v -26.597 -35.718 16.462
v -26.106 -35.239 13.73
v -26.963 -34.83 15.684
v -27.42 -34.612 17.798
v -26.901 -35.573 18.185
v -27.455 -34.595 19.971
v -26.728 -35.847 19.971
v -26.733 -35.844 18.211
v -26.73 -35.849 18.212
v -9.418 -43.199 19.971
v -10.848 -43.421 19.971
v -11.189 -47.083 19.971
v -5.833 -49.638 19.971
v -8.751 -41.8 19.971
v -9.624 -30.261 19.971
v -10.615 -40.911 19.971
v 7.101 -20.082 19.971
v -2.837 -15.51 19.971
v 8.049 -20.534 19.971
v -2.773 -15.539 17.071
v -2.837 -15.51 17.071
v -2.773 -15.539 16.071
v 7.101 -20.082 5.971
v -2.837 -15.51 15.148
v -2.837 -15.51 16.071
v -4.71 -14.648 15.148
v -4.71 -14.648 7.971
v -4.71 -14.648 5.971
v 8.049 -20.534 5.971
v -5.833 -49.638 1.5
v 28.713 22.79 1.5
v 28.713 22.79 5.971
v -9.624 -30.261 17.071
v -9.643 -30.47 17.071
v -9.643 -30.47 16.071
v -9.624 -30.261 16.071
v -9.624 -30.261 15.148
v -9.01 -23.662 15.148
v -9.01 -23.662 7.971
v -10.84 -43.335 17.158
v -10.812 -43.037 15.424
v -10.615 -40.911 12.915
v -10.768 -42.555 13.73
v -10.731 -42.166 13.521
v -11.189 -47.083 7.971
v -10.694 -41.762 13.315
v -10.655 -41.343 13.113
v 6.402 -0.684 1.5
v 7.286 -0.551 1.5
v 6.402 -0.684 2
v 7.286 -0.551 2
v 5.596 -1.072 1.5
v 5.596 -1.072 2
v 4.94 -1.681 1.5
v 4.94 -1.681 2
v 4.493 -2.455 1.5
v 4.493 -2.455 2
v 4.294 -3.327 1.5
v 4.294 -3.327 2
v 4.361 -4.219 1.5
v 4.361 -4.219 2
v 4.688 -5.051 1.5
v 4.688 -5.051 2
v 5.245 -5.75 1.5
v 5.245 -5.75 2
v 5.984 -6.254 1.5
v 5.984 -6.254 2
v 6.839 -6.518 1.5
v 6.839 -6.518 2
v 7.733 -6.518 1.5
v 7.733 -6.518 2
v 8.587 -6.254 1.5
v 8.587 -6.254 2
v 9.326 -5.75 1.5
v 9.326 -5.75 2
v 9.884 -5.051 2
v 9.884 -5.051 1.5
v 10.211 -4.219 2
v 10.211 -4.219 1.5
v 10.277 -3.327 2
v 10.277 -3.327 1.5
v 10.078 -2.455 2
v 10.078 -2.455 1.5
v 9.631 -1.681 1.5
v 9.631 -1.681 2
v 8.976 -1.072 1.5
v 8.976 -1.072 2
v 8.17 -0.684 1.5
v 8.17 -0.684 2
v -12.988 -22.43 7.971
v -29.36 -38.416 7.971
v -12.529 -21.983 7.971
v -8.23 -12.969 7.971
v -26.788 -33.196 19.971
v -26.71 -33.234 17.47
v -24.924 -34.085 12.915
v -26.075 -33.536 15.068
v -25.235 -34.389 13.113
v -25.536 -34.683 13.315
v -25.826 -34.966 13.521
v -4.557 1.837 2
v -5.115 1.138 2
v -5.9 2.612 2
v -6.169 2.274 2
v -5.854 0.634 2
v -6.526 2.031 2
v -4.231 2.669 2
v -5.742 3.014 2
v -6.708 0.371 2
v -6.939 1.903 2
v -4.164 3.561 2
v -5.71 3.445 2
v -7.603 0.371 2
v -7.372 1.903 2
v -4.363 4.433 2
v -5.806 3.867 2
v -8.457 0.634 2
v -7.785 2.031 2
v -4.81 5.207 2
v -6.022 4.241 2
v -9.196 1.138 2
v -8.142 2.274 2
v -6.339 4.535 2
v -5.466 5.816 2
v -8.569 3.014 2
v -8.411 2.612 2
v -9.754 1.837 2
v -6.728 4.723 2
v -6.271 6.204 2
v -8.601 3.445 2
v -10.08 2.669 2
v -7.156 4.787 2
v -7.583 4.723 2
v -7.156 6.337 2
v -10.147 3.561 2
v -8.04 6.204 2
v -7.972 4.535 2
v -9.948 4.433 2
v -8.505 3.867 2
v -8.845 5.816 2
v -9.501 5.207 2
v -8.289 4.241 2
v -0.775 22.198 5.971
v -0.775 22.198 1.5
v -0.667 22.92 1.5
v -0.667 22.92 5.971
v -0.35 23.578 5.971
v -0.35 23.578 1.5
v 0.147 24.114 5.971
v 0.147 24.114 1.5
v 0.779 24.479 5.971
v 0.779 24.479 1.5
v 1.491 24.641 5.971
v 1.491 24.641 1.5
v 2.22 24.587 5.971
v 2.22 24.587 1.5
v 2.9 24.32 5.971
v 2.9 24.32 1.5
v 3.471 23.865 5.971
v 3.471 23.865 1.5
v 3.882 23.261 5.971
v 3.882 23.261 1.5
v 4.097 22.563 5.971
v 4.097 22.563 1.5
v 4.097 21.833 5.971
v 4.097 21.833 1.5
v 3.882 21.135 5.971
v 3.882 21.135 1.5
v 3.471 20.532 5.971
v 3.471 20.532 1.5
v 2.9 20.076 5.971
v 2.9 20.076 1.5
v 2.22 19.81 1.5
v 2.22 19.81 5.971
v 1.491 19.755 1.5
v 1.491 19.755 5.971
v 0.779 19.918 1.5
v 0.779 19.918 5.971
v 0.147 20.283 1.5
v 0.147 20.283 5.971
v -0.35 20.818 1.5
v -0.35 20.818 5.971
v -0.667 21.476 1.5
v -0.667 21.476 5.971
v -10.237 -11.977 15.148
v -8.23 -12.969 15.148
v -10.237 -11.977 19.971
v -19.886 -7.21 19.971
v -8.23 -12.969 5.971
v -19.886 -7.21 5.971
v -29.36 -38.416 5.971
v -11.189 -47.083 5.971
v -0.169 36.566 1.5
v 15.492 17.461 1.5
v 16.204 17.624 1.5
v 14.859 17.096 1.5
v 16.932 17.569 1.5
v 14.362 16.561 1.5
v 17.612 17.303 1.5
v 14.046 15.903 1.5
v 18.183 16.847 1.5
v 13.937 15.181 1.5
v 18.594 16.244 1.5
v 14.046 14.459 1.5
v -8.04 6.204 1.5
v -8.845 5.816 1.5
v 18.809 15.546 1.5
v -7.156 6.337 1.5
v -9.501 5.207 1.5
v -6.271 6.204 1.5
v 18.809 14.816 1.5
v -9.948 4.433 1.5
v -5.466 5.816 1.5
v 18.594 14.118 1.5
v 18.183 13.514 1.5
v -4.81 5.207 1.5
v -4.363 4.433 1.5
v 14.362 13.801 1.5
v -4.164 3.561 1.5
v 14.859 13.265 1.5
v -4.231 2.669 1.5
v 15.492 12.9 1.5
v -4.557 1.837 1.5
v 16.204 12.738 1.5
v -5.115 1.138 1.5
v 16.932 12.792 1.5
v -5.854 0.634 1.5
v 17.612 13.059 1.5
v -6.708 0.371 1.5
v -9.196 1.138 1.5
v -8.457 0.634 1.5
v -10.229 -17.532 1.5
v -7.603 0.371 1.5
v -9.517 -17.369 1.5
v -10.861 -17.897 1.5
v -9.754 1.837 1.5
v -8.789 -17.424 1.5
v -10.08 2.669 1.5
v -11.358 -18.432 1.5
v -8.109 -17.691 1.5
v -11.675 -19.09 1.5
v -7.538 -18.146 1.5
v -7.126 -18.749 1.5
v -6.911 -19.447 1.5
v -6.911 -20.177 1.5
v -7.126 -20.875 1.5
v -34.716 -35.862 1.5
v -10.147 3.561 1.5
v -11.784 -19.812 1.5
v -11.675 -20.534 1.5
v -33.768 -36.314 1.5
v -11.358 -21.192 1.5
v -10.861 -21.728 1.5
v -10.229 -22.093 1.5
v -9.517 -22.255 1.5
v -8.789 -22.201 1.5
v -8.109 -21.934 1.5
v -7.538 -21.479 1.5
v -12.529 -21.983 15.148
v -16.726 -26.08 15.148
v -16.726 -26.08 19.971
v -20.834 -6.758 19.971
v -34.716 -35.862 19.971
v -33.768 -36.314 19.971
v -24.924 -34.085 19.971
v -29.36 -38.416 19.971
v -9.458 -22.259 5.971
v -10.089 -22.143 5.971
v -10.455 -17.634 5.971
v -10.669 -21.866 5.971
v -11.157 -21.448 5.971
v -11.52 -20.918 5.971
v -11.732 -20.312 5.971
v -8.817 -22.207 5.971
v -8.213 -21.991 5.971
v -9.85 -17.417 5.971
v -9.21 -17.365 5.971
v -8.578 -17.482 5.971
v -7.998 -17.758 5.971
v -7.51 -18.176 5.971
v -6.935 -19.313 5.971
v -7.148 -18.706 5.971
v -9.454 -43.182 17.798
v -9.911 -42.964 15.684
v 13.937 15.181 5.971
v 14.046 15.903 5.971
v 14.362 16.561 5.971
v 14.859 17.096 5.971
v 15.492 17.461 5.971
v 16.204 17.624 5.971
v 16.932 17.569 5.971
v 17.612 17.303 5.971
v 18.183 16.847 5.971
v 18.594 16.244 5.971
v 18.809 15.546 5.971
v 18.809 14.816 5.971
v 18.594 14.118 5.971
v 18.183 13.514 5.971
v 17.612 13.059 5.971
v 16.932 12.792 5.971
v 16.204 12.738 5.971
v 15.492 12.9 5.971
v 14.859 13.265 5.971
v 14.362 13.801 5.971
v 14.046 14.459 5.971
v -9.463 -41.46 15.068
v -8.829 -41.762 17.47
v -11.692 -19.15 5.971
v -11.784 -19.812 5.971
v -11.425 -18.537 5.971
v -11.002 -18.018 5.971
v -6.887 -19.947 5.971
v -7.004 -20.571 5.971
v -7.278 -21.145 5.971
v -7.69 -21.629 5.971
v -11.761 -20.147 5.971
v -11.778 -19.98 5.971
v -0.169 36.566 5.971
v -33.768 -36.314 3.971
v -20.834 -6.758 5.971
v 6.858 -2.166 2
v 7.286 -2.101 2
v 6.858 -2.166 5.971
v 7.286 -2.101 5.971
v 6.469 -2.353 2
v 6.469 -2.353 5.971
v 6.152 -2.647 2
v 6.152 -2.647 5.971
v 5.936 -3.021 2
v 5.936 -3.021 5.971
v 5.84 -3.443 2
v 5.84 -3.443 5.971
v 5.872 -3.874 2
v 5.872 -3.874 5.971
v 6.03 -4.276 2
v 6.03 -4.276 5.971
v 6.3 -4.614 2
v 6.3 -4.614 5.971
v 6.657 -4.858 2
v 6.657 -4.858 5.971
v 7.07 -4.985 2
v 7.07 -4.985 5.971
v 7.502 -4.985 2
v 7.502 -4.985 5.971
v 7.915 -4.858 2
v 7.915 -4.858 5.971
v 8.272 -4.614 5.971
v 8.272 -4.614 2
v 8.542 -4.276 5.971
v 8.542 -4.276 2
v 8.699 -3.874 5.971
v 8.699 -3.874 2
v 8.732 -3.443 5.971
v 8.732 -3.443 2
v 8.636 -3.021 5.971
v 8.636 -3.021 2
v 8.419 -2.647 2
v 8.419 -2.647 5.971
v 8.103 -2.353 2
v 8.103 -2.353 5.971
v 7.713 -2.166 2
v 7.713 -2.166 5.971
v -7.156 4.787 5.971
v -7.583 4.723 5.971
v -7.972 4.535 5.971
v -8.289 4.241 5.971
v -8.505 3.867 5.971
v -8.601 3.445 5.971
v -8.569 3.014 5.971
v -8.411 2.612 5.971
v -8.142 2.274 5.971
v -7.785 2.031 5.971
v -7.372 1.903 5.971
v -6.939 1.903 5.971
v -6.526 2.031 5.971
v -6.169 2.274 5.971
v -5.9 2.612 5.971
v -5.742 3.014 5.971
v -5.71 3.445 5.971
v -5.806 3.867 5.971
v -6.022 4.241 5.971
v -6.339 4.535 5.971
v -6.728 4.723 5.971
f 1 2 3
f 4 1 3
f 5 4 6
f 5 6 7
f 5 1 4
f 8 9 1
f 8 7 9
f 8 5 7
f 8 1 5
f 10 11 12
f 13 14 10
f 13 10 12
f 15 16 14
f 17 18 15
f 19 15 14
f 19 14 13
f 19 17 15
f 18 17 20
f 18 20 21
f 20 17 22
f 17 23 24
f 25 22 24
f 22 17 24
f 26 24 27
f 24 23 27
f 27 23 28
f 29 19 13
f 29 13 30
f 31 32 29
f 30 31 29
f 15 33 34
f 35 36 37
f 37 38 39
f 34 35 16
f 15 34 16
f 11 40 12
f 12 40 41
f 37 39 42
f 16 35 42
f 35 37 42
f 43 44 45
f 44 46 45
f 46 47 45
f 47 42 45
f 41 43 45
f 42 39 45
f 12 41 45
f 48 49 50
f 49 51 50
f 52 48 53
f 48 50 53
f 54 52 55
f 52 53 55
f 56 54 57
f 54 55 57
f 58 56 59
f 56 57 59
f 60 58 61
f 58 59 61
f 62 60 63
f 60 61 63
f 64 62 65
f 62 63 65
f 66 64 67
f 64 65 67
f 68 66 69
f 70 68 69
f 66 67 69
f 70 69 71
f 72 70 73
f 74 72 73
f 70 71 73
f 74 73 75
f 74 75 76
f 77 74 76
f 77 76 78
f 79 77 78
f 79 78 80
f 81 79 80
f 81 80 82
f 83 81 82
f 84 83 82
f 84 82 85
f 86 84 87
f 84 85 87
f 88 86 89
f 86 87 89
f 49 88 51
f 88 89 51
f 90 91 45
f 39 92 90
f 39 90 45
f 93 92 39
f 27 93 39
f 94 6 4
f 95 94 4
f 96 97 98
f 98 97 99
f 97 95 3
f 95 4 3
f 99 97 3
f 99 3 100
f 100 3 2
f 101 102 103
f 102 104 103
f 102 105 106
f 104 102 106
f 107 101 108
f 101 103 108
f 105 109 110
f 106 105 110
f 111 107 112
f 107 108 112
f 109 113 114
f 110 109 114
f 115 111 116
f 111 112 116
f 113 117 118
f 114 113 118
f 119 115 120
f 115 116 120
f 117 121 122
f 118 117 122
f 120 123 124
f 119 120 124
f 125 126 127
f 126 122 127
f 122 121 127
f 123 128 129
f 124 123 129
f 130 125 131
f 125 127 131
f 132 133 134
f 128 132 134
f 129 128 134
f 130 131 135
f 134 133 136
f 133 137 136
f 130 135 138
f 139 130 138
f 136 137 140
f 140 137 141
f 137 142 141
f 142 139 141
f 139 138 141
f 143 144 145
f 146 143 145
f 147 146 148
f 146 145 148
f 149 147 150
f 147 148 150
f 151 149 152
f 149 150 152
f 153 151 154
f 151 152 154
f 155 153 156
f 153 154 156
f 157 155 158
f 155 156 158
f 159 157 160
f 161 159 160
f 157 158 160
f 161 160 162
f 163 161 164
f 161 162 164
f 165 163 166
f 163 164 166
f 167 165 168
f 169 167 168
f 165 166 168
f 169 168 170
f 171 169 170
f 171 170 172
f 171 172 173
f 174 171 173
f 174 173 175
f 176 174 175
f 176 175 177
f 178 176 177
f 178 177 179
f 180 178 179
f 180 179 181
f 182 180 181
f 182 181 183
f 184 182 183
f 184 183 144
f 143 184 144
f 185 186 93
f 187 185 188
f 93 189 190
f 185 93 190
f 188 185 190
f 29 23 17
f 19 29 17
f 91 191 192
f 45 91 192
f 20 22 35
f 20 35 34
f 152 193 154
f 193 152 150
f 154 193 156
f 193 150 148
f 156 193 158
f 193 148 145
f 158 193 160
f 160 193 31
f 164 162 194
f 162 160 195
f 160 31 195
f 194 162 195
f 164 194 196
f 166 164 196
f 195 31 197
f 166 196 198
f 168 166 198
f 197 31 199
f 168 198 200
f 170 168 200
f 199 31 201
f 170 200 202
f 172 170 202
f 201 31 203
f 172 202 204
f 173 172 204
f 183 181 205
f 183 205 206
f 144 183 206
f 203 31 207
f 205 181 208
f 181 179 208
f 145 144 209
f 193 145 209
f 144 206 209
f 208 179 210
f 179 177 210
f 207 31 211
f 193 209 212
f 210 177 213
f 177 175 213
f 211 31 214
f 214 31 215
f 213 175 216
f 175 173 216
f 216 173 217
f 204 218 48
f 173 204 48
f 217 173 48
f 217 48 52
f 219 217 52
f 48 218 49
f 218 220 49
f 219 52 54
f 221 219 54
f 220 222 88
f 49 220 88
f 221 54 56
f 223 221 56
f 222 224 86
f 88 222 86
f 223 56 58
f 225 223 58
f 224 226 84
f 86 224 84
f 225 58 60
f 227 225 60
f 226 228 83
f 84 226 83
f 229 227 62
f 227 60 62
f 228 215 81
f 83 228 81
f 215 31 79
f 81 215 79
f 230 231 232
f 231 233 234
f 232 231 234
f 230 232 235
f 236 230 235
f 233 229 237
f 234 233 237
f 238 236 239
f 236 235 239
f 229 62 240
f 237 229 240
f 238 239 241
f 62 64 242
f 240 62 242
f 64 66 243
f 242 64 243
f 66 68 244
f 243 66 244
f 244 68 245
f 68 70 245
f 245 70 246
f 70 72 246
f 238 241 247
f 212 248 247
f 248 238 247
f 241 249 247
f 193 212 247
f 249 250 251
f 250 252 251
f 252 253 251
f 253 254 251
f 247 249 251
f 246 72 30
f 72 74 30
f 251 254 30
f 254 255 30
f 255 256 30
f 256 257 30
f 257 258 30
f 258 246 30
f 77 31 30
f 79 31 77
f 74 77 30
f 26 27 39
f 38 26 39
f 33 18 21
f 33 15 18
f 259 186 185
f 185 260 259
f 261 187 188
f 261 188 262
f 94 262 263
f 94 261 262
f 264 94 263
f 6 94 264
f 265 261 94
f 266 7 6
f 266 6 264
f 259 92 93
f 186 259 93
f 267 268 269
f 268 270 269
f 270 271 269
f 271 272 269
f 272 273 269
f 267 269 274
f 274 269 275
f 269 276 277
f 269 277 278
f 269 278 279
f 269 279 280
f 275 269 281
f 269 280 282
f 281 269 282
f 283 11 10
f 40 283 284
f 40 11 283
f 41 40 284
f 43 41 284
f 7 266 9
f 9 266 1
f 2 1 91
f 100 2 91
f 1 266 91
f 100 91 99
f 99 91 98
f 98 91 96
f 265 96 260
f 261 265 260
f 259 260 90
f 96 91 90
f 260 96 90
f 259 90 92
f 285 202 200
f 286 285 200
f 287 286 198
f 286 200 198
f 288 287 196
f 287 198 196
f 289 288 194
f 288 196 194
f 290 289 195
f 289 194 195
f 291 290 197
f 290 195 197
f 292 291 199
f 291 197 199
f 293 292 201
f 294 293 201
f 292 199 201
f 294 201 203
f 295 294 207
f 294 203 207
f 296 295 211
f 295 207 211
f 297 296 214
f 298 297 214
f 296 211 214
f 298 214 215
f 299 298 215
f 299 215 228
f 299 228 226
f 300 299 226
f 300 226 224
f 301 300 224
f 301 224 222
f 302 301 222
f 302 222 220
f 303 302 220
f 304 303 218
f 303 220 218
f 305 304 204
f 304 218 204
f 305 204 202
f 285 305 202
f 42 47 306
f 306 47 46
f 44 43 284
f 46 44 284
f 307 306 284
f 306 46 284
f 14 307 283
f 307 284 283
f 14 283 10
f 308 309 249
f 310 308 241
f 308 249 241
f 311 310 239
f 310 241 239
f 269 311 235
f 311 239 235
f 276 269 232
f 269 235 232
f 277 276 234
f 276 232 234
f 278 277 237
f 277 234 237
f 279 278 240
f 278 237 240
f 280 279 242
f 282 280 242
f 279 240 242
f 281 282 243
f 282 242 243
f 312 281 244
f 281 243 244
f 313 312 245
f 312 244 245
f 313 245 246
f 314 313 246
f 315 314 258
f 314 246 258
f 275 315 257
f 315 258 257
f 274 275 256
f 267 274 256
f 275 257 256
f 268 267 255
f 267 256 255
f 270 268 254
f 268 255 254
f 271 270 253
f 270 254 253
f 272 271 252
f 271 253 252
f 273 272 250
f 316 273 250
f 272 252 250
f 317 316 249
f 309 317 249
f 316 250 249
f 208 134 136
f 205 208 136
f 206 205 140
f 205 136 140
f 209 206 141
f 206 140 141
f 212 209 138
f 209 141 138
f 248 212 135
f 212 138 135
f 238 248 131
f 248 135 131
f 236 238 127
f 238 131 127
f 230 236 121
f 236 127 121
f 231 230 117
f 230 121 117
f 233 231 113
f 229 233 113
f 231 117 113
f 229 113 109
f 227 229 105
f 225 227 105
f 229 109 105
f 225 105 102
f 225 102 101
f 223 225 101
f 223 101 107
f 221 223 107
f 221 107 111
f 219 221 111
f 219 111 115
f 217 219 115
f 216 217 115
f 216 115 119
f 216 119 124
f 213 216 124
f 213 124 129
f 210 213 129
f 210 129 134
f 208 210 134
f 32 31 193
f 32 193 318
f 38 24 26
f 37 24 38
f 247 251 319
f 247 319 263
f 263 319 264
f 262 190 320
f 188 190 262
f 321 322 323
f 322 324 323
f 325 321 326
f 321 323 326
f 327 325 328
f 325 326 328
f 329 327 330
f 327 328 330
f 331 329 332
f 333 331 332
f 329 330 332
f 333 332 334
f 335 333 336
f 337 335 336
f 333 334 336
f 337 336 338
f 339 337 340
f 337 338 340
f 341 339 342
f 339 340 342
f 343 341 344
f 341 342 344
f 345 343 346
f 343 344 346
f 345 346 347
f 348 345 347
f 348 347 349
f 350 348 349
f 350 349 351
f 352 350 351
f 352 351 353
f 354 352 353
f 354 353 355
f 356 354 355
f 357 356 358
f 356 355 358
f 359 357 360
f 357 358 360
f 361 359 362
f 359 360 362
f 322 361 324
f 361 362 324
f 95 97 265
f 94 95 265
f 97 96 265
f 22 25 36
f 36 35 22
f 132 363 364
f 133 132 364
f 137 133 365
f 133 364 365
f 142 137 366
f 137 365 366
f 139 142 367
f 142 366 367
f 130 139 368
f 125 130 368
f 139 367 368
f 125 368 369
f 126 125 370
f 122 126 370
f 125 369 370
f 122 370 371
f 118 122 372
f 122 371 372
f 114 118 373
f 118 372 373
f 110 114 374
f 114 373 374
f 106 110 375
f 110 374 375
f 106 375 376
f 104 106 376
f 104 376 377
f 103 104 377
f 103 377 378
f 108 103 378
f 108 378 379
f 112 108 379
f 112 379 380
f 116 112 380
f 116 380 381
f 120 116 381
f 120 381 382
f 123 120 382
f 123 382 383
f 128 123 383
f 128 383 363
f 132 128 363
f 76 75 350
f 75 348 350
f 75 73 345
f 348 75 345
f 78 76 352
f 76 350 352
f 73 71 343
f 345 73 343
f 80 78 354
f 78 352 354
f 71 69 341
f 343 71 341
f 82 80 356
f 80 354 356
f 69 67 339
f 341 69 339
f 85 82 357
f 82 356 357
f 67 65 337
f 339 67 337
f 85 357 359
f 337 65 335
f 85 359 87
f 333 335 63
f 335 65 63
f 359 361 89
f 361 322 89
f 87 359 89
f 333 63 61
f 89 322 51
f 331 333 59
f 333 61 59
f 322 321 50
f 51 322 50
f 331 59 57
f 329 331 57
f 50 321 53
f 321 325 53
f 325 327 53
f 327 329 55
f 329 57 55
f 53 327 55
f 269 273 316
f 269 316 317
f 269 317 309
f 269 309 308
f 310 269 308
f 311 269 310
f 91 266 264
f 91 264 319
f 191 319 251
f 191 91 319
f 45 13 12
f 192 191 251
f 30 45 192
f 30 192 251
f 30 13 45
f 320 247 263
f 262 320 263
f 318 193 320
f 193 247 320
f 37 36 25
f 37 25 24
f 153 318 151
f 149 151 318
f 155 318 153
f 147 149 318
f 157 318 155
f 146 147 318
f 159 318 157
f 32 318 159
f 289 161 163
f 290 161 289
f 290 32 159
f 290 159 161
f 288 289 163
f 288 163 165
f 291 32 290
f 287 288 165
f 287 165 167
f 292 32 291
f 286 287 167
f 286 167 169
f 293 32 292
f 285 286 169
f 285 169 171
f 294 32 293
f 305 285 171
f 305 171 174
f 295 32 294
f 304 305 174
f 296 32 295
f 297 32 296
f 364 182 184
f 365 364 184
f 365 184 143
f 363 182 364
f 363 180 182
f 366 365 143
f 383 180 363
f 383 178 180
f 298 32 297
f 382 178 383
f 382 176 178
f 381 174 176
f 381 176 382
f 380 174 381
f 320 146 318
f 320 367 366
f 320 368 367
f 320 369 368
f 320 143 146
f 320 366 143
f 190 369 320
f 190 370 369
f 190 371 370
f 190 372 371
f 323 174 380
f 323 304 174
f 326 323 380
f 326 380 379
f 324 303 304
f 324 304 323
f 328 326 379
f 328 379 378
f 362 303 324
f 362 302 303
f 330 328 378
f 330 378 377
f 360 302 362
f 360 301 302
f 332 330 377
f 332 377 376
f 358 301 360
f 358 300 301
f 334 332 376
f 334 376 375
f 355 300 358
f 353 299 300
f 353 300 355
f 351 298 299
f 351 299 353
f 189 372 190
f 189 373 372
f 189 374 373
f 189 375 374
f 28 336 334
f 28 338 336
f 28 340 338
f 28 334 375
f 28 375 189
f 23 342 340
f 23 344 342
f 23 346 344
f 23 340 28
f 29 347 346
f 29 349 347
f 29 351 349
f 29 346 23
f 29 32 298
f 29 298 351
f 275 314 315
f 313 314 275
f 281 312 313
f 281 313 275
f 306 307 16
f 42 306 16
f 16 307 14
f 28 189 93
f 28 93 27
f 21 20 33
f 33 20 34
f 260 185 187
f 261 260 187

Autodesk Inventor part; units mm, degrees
ref_plane "YZ Plane" through (0, 0, 0) normal (1, 0, 0) x (0, 1, 0)
ref_plane "XZ Plane" through (0, 0, 0) normal (0, 1, 0) x (-1, 0, 0)
ref_plane "Work Plane1" through (0, 0, 1.5) normal (0, 0, 1) x (1, 0, 0)
sketch "Sketch1" plane through (0, 0, 1.5) normal (0, 0, 1) x (1, 0, 0)
  line L0 (8.75354, 57.756452) -> (7.809034, 57.756452) construction
  line L1 (-24.776894, -15.05709) -> (8.75354, 57.756452) construction
  line L2 (-24.776894, -52.66184) -> (-24.776894, -15.05709) construction
  line L3 (-18.707308, -55.556884) -> (-24.776894, -52.66184) construction
  line L4 (-18.707308, -40.563421) -> (-18.707308, -55.556884) construction
  line L5 (0.391621, -40.563421) -> (-18.707308, -40.563421) construction
  line L6 (23.692692, 8.28829) -> (0.391621, -40.563421) construction
  line L7 (23.692692, 53.178978) -> (23.692692, 8.28829) construction
  line L8 (8.974225, 60.199326) -> (23.692692, 53.178978) construction
  line L9 (7.809034, 57.756452) -> (8.974225, 60.199326) construction
  circle A0 centre (-21.307308, -37.886297) radius 1.6 construction
  circle A1 centre (-21.307308, -27.886297) radius 1.6 construction
  line L10 (11.632256, -10.582296) -> (32.395806, 32.949392)
  line L11 (-15.355044, 2.289986) -> (5.408506, 45.821674)
  line L12 (5.408506, 45.821674) -> (32.395806, 32.949392)
  line L13 (32.395806, 32.949392) -> (-10.655303, -57.309136)
  line L14 (-10.655303, -57.309136) -> (-37.642603, -44.436855)
  line L15 (-37.642603, -44.436855) -> (5.408506, 45.821674)
  circle A2 centre (11.737087, 5.432666) radius 3
  circle A3 centre (-13.983408, -29.560487) radius 3
  circle A4 centre (-2.975053, 12.449997) radius 3
  point P0 (0, 0)
  dimension "d1" = 100
ref_plane "Work Plane2" through (4.456703, -9.721274, 3.970957) normal (0, 0, -1) x (0.4305111, 0.9025853, 0)
ref_plane "Work Plane6" through (4.456703, -9.721274, 2.470957) normal (0, 0, -1) x (0.4305111, 0.9025853, 0)
extrude "Extrusion1" add sketch "Sketch1" along normal up to surface (2.470957 mm away) contours L13 L14 L15 L11 L12 L10 | A2 | A3 | A4
sketch "Sketch2" plane through (-10.655303, -57.309136, 3.970957) normal (0, 0, 1) x (0.9025853, -0.4305111, 0)
  line L0 (0, 0) -> (0, 100)
  line L1 (0, 100) -> (-29.9, 100)
  line L2 (-29.9, 100) -> (-29.9, 0)
  line L3 (-29.9, 0) -> (0, 0)
  line L4 (-21.95, 51.77) -> (-27.9, 51.77)
  line L5 (-2, 51.77) -> (-7.95, 51.77)
  line L6 (-19.05, 34.77) -> (-10.85, 34.77)
  arc A0 (-27.45, 2.77) -> (-2.45, 2.77) centre (-14.95, 20.30125) ccw construction
  arc A1 (-2.45, 4.77) -> (-27.45, 4.77) centre (-14.95, -12.76125) ccw construction
  line L7 (-27.45, 2.77) -> (-27.45, 4.77) construction
  line L8 (-2.45, 2.77) -> (-2.45, 4.77) construction
  line L9 (-29.9, 0) -> (0, 0)
  line L10 (-25.477276, 0) -> (-25.477276, 7.745132)
  line L11 (-25.477276, 7.745132) -> (-16.899837, 31.078166)
  line L12 (-16.899837, 31.078166) -> (-16.899837, 41.065184)
  line L13 (-16.899837, 41.065184) -> (-29.9, 41.24513)
  line L14 (-29.9, 100) -> (-29.9, 0)
  line L15 (-29.9, 0) -> (-29.9, 41.24513)
  line L16 (-14.95, 0) -> (-14.95, 40.435372) construction
  line L17 (-2.45, 2.77) -> (-2.45, 4.77) construction
  line L18 (-4.422724, 0) -> (-4.422724, 7.745132)
  line L19 (-4.422724, 7.745132) -> (-13.000163, 31.078166)
  line L20 (-13.000163, 31.078166) -> (-13.000163, 41.065184)
  line L21 (-13.000163, 41.065184) -> (0, 41.24513)
  line L22 (0, 0) -> (0, 41.24513)
  line L23 (0, 0) -> (0, 100) construction
  line L24 (0, 41.24513) -> (0, 0) construction
  line L25 (0, 0) -> (-4.422724, 0) construction
  point P0 (-15.054899, 56.31361)
extrude "Extrusion2" add sketch "Sketch2" along normal blind 16 contours L3 L2 L13 L12 L11 L10
ref_plane "Work Plane3" through (-24.148953, -50.872995, 3.970957) normal (0.9025853, -0.4305111, 0) x (0, 0, -1)
mirror "Mirror1" about plane through (-24.148953, -50.872995, 3.970957) normal (0.9025853, -0.4305111, 0) of "Extrusion2"
sketch "Sketch3" plane through (-4.710042, -14.647591, 19.970957) normal (0.4179776, 0.9084573, 0) x (0.9084573, -0.4179776, 0)
  ellipse E0 centre (-1.967577, -0.95) end of major axis (-1.967577, 1.897221) minor radius 2.846948 construction
  line L0 (2.132031, -4.8) -> (2.132031, 2.9) construction
  line L1 (2.132031, 2.9) -> (-6.067184, 2.9) construction
  line L2 (-6.067184, 2.9) -> (-6.067184, -4.8) construction
  line L3 (-6.067184, -4.8) -> (2.132031, -4.8) construction
  line L4 (2.132031, -4.8) -> (2.132031, 2.9)
  line L5 (2.132031, 2.9) -> (-6.067184, 2.9)
  line L6 (-6.067184, 2.9) -> (-6.067184, -4.8)
  line L7 (-6.067184, -4.8) -> (2.132031, -4.8)
  line L8 (2.132031, 2.9) -> (-6.067184, 2.9)
  line L9 (-6.067184, 2.9) -> (-6.067184, 3.9)
  line L10 (-6.067184, 3.9) -> (2.132031, 3.9)
  line L11 (2.132031, 3.9) -> (2.132031, 2.9)
  ellipse E1 centre (-2.037491, 0.97324) end of major axis (-2.037491, 3.820462) minor radius 2.846948
  line L12 (2.062116, -2.87676) -> (2.062116, 4.82324)
  line L13 (-6.137098, -2.87676) -> (2.062116, -2.87676)
  line L14 (-6.137098, 4.82324) -> (-6.137098, -2.87676)
  line L15 (2.062116, 4.82324) -> (-6.137098, 4.82324)
  point P0 (-1.843493, 19.970957)
  dimension "d6" = 0
  dimension "d40" = 1
extrude "Extrusion3" cut sketch "Sketch3" along normal through all both and the other way through all contours L5 L12 L10 L11 | L12 L13 L6 L5 E1 | L5 E1 L9 L10 L12 | L13 L14 L15 L12 L10 L9 L6 | E1 L5 | L5 E1
sketch "Sketch4" plane through (-24.148953, -50.872995, 3.970957) normal (0.9025853, -0.4305111, 0) x (0, 0, -1)
  arc A0 (-27.45, 2.77) -> (-2.45, 2.77) centre (-14.95, 20.30125) ccw
  line L0 (-27.45, 2.77) -> (-27.45, 4.77)
  arc A1 (-2.45, 4.77) -> (-27.45, 4.77) centre (-14.95, -12.76125) ccw
  arc A2 (-2.475103, 4.91042) -> (-27.55, 4.82144) centre (-14.95, -12.76125) ccw
  line L1 (-27.55, 4.82144) -> (-27.55, 2.71856)
  arc A3 (-27.55, 2.71856) -> (-2.475103, 2.62958) centre (-14.95, 20.30125) ccw
  line L2 (-15.02676, 8.869864) -> (-15.02676, -1.329864)
  point P0 (3.970957, 56.31361)
  dimension "d9" = 0.1
revolve "Revolution1" cut sketch "Sketch4" angle 360 about axis through (-20.330379, -42.867187, 18.997716) along (-0.4305111, -0.9025853, 0)
sketch "Sketch5" plane through (0, 0, 1.5) normal (0, 0, -1) x (-1, 0, 0)
  circle A0 centre (-11.737087, 5.432666) radius 3 construction
  circle A1 centre (2.975053, 12.449997) radius 3 construction
  point P0 (0, 0)
sketch "Sketch6" plane through (0, 0, 1.5) normal (0, 0, -1) x (-1, 0, 0)
  line L0 (-4.381017, 8.941331) -> (-7.825106, 16.162014)
  line L1 (-8.686128, 17.967184) -> (-12.130217, 25.187866)
  circle A0 centre (10.53932, -22.339805) radius 2.45
  circle A1 centre (-15.181176, 12.653348) radius 2.45
  circle A2 centre (-0.469036, 19.670679) radius 2.45
  circle A3 centre (-7.285825, -3.551175) radius 1.45
  circle A4 centre (7.155539, 3.337003) radius 1.45
  line L2 (-32.395806, 32.949392) -> (-5.408506, 45.821674)
  line L3 (10.655303, -57.309136) -> (-32.395806, 32.949392)
  point P0 (0, 0)
  dimension "d48" = 8
  dimension "d51" = 4.9
  dimension "d54" = 4.9
  dimension "d55" = 4.9
  dimension "d56" = 2.9
  dimension "d57" = 2.9
  dimension "d83" = 43.755
  dimension "d84" = 43.755
  dimension "d85" = 13.1
  dimension "d86" = 6.95
sketch "Sketch7" plane through (5.408506, 45.821674, 3.970957) normal (0, 0, 1) x (0.9025853, -0.4305111, 0)
  line L0 (25.477276, -100) -> (25.477276, -92.254868)
  line L1 (25.477276, -92.254868) -> (16.899837, -68.921834)
  line L2 (16.899837, -68.921834) -> (16.899837, -58.934816)
  line L3 (16.899837, -58.934816) -> (29.9, -58.75487)
  line L4 (29.9, -58.75487) -> (29.9, 0)
  line L5 (29.9, 0) -> (0, 0)
  line L6 (0, 0) -> (0, -58.75487)
  line L7 (0, -58.75487) -> (13.000163, -58.934816)
  line L8 (13.000163, -58.934816) -> (13.000163, -68.921834)
  line L9 (13.000163, -68.921834) -> (4.422724, -92.254868)
  line L10 (4.422724, -92.254868) -> (4.422724, -100)
  line L11 (4.422724, -100) -> (25.477276, -100)
  line L12 (13.000163, -58.934816) -> (13.000163, -68.921834)
  line L13 (13.000163, -58.934816) -> (16.899837, -58.934816)
  point P0 (14.845101, -43.68639)
extrude "Extrusion5" add sketch "Sketch7" along normal blind 2
sketch "Sketch8" plane through (32.395806, 32.949392, 3.970957) normal (0.9025853, -0.4305111, 0) x (0, 0, -1)
  line L0 (2.470957, -100) -> (-16, -100)
  line L1 (2.470957, -100) -> (2.470957, 0)
  line L2 (-2, -58.75487) -> (-16, -58.75487)
  line L3 (-16, -58.75487) -> (-16, -100)
  line L4 (-16, -100) -> (2.470957, -100)
  line L5 (2.470957, -100) -> (2.470957, 0)
  line L6 (2.470957, 0) -> (-16, 0)
  line L7 (-16, 0) -> (-16, -100)
  line L8 (2.470957, 0) -> (-2, 0)
  line L9 (-2, -58.75487) -> (-2, 0)
  line L10 (-16, -58.75487) -> (2.470957, -58.75487)
  line L11 (2.470957, -100) -> (2.470957, 0)
  point P0 (3.970957, -43.68639)
extrude "Extrusion7" add sketch "Sketch8" along normal blind 1.05 contours L0 L3 L2 L10 L1 | L10 L9 L6 L1
ref_plane "Work Plane4" through (-74.107308, 67.113703, 4) normal (0, 1, 0) x (1, 0, 0)
sketch "Sketch10" plane through (-74.107308, 67.113703, 4) normal (0, 1, 0) x (1, 0, 0)
  circle A0 centre (-42.022145, 16.72324) radius 3
  circle A1 centre (-42.022145, 16.72324) radius 4.301236
  point P0 (74.107308, 4)
extrude "Extrusion9" cut sketch "Sketch10" against normal through all contours A0 | A1
ref_plane "Work Plane5" through (0, 0, 0) normal (0, 0, -1) x (-1, 0, 0)
sketch "Sketch12" plane through (-24.148953, -50.872995, 3.970957) normal (0.9025853, -0.4305111, 0) x (0, 0, -1)
  line L0 (-25.02676, 14.71856) -> (-5.02676, 14.71856)
  line L1 (-25.02676, 14.71856) -> (-25.02676, 13.31856)
  arc A0 (-25.02676, 13.31856) -> (-15.093782, 10.018425) centre (-15.093782, 26.616977) ccw
  line L2 (-5.02676, 14.81856) -> (-25.12676, 14.81856)
  line L3 (-25.12676, 14.81856) -> (-25.12676, 13.268531)
  arc A1 (-25.12676, 13.268531) -> (-15.093782, 9.918425) centre (-15.093782, 26.616977) ccw
  line L4 (-15.093782, 9.918425) -> (-15.093782, 14.81856)
  line L5 (-15.093782, 9.918425) -> (-10.193647, 9.918425) construction
  point P0 (3.970957, 56.31361)
  dimension "d41" = 0.1
  dimension "d42" = 90
revolve "Revolution2" cut sketch "Sketch12" angle 360 about axis through (-19.878961, -41.920771, 19.064739) along (0.4305111, 0.9025853, 0)
sketch "Sketch13" plane through (33.343521, 32.497355, 3.970957) normal (0.9025853, -0.4305111, 0) x (0, 0, -1)
  line L0 (2.470957, -100) -> (-16, -100)
  line L1 (-16, 0) -> (-16, -100)
  line L2 (3.970957, -100) -> (-16, -100)
  line L3 (-16, -100) -> (-16, -91)
  line L4 (-16, -91) -> (3.970957, -91)
  line L5 (3.970957, -91) -> (3.970957, -100)
  point P0 (3.970957, -43.68639)
  dimension "d44" = 9
extrude "Extrusion10" cut sketch "Sketch13" against normal through all
hole "Hole3" at (7.285825, -3.551175, 1.5) at (-7.155539, 3.337003, 1.5) direction (0, 0, 1) diameter 2.9 end through all counterbore diameter 6 counterbore depth 0.5
sketch "Sketch14" plane through (0, 0, 1.5) normal (0, 0, -1) x (-1, 0, 0)
  circle A0 centre (9.333775, -19.812328) radius 2.45
  circle A1 centre (-16.38672, 15.180825) radius 2.45
  circle A2 centre (-1.67458, 22.198156) radius 2.45
  circle A3 centre (-19.486287, 21.679201) radius 1.45
  circle A4 centre (-4.774147, 28.696532) radius 1.45
  line L0 (29.359754, -38.416214) -> (11.188953, -47.083242)
  line L1 (20.274354, -42.749728) -> (9.333775, -19.812328)
  line L2 (-7.825106, 16.162014) -> (-8.600026, 17.786667)
  line L3 (-15.956209, 14.27824) -> (-1.243956, 21.295333)
  point P0 (0, 0)
  point P1 (0, 0)
  dimension "d73" = 4.9
  dimension "d74" = 4.9
  dimension "d75" = 4.9
  dimension "d76" = 2.9
  dimension "d77" = 2.9
  dimension "d94" = 25.413
  dimension "d95" = 1.8
extrude "Extrusion11" cut sketch "Sketch14" against normal blind 4.471 contours A0 | A1 | A2
sketch "Sketch15" plane through (5.408506, 45.821674, 5.970957) normal (0, 0, 1) x (0.9025853, -0.4305111, 0)
  line L0 (13.000163, -58.934816) -> (13.000163, -68.921834)
  line L1 (4.884025, -91) -> (25.015975, -91)
  line L2 (16.899837, -68.921834) -> (25.015975, -91)
  line L3 (12.77916, -69.523024) -> (13.000163, -68.921834)
  line L4 (4.884025, -91) -> (13.000163, -68.921834)
  line L5 (29.9, -58.75487) -> (16.899837, -58.934816)
  line L6 (13.000163, -58.934816) -> (16.899837, -58.934816)
  line L7 (16.899837, -68.921834) -> (16.899837, -58.934816)
  line L8 (17.12084, -69.523024) -> (16.899837, -68.921834)
  point P0 (14.845101, -43.68639)
extrude "Extrusion12" add sketch "Sketch15" along normal blind 2
sketch "Sketch16" plane through (-19.886117, -7.209607, 5.970957) normal (-0.9025853, 0.4305111, 0) x (0, 0, 1)
  line L0 (-4.470957, -32.24513) -> (14, -32.24513)
  line L1 (14, 0) -> (14, -32.24513)
  line L2 (0, 0) -> (14, 0)
  line L3 (0, 58.75487) -> (0, 0)
  line L4 (-4.470957, 58.75487) -> (0, 58.75487)
  line L5 (-4.470957, 58.75487) -> (-4.470957, -32.24513)
  point P0 (-5.970957, 15.068479)
extrude "Extrusion13" add sketch "Sketch16" along normal blind 1.05
sketch "Sketch17" plane through (33.343521, 32.497355, 3.970957) normal (0.9025853, -0.4305111, 0) x (0, 0, -1)
  line L0 (2.470957, 0) -> (-2, 0)
  line L1 (2.470957, 0) -> (2.470957, -91)
  line L2 (-2, 0) -> (2.470957, 0)
  line L3 (2.470957, 0) -> (2.470957, -10.755)
  line L4 (2.470957, -10.755) -> (-2, -10.755)
  line L5 (-2, -10.755) -> (-2, 0)
  point P0 (3.970957, -43.68639)
  dimension "d89" = 10.755
extrude "Extrusion14" cut sketch "Sketch17" against normal through all
properties part number "30_CUBE_openSIM_Laser_Telescope_Mount"
